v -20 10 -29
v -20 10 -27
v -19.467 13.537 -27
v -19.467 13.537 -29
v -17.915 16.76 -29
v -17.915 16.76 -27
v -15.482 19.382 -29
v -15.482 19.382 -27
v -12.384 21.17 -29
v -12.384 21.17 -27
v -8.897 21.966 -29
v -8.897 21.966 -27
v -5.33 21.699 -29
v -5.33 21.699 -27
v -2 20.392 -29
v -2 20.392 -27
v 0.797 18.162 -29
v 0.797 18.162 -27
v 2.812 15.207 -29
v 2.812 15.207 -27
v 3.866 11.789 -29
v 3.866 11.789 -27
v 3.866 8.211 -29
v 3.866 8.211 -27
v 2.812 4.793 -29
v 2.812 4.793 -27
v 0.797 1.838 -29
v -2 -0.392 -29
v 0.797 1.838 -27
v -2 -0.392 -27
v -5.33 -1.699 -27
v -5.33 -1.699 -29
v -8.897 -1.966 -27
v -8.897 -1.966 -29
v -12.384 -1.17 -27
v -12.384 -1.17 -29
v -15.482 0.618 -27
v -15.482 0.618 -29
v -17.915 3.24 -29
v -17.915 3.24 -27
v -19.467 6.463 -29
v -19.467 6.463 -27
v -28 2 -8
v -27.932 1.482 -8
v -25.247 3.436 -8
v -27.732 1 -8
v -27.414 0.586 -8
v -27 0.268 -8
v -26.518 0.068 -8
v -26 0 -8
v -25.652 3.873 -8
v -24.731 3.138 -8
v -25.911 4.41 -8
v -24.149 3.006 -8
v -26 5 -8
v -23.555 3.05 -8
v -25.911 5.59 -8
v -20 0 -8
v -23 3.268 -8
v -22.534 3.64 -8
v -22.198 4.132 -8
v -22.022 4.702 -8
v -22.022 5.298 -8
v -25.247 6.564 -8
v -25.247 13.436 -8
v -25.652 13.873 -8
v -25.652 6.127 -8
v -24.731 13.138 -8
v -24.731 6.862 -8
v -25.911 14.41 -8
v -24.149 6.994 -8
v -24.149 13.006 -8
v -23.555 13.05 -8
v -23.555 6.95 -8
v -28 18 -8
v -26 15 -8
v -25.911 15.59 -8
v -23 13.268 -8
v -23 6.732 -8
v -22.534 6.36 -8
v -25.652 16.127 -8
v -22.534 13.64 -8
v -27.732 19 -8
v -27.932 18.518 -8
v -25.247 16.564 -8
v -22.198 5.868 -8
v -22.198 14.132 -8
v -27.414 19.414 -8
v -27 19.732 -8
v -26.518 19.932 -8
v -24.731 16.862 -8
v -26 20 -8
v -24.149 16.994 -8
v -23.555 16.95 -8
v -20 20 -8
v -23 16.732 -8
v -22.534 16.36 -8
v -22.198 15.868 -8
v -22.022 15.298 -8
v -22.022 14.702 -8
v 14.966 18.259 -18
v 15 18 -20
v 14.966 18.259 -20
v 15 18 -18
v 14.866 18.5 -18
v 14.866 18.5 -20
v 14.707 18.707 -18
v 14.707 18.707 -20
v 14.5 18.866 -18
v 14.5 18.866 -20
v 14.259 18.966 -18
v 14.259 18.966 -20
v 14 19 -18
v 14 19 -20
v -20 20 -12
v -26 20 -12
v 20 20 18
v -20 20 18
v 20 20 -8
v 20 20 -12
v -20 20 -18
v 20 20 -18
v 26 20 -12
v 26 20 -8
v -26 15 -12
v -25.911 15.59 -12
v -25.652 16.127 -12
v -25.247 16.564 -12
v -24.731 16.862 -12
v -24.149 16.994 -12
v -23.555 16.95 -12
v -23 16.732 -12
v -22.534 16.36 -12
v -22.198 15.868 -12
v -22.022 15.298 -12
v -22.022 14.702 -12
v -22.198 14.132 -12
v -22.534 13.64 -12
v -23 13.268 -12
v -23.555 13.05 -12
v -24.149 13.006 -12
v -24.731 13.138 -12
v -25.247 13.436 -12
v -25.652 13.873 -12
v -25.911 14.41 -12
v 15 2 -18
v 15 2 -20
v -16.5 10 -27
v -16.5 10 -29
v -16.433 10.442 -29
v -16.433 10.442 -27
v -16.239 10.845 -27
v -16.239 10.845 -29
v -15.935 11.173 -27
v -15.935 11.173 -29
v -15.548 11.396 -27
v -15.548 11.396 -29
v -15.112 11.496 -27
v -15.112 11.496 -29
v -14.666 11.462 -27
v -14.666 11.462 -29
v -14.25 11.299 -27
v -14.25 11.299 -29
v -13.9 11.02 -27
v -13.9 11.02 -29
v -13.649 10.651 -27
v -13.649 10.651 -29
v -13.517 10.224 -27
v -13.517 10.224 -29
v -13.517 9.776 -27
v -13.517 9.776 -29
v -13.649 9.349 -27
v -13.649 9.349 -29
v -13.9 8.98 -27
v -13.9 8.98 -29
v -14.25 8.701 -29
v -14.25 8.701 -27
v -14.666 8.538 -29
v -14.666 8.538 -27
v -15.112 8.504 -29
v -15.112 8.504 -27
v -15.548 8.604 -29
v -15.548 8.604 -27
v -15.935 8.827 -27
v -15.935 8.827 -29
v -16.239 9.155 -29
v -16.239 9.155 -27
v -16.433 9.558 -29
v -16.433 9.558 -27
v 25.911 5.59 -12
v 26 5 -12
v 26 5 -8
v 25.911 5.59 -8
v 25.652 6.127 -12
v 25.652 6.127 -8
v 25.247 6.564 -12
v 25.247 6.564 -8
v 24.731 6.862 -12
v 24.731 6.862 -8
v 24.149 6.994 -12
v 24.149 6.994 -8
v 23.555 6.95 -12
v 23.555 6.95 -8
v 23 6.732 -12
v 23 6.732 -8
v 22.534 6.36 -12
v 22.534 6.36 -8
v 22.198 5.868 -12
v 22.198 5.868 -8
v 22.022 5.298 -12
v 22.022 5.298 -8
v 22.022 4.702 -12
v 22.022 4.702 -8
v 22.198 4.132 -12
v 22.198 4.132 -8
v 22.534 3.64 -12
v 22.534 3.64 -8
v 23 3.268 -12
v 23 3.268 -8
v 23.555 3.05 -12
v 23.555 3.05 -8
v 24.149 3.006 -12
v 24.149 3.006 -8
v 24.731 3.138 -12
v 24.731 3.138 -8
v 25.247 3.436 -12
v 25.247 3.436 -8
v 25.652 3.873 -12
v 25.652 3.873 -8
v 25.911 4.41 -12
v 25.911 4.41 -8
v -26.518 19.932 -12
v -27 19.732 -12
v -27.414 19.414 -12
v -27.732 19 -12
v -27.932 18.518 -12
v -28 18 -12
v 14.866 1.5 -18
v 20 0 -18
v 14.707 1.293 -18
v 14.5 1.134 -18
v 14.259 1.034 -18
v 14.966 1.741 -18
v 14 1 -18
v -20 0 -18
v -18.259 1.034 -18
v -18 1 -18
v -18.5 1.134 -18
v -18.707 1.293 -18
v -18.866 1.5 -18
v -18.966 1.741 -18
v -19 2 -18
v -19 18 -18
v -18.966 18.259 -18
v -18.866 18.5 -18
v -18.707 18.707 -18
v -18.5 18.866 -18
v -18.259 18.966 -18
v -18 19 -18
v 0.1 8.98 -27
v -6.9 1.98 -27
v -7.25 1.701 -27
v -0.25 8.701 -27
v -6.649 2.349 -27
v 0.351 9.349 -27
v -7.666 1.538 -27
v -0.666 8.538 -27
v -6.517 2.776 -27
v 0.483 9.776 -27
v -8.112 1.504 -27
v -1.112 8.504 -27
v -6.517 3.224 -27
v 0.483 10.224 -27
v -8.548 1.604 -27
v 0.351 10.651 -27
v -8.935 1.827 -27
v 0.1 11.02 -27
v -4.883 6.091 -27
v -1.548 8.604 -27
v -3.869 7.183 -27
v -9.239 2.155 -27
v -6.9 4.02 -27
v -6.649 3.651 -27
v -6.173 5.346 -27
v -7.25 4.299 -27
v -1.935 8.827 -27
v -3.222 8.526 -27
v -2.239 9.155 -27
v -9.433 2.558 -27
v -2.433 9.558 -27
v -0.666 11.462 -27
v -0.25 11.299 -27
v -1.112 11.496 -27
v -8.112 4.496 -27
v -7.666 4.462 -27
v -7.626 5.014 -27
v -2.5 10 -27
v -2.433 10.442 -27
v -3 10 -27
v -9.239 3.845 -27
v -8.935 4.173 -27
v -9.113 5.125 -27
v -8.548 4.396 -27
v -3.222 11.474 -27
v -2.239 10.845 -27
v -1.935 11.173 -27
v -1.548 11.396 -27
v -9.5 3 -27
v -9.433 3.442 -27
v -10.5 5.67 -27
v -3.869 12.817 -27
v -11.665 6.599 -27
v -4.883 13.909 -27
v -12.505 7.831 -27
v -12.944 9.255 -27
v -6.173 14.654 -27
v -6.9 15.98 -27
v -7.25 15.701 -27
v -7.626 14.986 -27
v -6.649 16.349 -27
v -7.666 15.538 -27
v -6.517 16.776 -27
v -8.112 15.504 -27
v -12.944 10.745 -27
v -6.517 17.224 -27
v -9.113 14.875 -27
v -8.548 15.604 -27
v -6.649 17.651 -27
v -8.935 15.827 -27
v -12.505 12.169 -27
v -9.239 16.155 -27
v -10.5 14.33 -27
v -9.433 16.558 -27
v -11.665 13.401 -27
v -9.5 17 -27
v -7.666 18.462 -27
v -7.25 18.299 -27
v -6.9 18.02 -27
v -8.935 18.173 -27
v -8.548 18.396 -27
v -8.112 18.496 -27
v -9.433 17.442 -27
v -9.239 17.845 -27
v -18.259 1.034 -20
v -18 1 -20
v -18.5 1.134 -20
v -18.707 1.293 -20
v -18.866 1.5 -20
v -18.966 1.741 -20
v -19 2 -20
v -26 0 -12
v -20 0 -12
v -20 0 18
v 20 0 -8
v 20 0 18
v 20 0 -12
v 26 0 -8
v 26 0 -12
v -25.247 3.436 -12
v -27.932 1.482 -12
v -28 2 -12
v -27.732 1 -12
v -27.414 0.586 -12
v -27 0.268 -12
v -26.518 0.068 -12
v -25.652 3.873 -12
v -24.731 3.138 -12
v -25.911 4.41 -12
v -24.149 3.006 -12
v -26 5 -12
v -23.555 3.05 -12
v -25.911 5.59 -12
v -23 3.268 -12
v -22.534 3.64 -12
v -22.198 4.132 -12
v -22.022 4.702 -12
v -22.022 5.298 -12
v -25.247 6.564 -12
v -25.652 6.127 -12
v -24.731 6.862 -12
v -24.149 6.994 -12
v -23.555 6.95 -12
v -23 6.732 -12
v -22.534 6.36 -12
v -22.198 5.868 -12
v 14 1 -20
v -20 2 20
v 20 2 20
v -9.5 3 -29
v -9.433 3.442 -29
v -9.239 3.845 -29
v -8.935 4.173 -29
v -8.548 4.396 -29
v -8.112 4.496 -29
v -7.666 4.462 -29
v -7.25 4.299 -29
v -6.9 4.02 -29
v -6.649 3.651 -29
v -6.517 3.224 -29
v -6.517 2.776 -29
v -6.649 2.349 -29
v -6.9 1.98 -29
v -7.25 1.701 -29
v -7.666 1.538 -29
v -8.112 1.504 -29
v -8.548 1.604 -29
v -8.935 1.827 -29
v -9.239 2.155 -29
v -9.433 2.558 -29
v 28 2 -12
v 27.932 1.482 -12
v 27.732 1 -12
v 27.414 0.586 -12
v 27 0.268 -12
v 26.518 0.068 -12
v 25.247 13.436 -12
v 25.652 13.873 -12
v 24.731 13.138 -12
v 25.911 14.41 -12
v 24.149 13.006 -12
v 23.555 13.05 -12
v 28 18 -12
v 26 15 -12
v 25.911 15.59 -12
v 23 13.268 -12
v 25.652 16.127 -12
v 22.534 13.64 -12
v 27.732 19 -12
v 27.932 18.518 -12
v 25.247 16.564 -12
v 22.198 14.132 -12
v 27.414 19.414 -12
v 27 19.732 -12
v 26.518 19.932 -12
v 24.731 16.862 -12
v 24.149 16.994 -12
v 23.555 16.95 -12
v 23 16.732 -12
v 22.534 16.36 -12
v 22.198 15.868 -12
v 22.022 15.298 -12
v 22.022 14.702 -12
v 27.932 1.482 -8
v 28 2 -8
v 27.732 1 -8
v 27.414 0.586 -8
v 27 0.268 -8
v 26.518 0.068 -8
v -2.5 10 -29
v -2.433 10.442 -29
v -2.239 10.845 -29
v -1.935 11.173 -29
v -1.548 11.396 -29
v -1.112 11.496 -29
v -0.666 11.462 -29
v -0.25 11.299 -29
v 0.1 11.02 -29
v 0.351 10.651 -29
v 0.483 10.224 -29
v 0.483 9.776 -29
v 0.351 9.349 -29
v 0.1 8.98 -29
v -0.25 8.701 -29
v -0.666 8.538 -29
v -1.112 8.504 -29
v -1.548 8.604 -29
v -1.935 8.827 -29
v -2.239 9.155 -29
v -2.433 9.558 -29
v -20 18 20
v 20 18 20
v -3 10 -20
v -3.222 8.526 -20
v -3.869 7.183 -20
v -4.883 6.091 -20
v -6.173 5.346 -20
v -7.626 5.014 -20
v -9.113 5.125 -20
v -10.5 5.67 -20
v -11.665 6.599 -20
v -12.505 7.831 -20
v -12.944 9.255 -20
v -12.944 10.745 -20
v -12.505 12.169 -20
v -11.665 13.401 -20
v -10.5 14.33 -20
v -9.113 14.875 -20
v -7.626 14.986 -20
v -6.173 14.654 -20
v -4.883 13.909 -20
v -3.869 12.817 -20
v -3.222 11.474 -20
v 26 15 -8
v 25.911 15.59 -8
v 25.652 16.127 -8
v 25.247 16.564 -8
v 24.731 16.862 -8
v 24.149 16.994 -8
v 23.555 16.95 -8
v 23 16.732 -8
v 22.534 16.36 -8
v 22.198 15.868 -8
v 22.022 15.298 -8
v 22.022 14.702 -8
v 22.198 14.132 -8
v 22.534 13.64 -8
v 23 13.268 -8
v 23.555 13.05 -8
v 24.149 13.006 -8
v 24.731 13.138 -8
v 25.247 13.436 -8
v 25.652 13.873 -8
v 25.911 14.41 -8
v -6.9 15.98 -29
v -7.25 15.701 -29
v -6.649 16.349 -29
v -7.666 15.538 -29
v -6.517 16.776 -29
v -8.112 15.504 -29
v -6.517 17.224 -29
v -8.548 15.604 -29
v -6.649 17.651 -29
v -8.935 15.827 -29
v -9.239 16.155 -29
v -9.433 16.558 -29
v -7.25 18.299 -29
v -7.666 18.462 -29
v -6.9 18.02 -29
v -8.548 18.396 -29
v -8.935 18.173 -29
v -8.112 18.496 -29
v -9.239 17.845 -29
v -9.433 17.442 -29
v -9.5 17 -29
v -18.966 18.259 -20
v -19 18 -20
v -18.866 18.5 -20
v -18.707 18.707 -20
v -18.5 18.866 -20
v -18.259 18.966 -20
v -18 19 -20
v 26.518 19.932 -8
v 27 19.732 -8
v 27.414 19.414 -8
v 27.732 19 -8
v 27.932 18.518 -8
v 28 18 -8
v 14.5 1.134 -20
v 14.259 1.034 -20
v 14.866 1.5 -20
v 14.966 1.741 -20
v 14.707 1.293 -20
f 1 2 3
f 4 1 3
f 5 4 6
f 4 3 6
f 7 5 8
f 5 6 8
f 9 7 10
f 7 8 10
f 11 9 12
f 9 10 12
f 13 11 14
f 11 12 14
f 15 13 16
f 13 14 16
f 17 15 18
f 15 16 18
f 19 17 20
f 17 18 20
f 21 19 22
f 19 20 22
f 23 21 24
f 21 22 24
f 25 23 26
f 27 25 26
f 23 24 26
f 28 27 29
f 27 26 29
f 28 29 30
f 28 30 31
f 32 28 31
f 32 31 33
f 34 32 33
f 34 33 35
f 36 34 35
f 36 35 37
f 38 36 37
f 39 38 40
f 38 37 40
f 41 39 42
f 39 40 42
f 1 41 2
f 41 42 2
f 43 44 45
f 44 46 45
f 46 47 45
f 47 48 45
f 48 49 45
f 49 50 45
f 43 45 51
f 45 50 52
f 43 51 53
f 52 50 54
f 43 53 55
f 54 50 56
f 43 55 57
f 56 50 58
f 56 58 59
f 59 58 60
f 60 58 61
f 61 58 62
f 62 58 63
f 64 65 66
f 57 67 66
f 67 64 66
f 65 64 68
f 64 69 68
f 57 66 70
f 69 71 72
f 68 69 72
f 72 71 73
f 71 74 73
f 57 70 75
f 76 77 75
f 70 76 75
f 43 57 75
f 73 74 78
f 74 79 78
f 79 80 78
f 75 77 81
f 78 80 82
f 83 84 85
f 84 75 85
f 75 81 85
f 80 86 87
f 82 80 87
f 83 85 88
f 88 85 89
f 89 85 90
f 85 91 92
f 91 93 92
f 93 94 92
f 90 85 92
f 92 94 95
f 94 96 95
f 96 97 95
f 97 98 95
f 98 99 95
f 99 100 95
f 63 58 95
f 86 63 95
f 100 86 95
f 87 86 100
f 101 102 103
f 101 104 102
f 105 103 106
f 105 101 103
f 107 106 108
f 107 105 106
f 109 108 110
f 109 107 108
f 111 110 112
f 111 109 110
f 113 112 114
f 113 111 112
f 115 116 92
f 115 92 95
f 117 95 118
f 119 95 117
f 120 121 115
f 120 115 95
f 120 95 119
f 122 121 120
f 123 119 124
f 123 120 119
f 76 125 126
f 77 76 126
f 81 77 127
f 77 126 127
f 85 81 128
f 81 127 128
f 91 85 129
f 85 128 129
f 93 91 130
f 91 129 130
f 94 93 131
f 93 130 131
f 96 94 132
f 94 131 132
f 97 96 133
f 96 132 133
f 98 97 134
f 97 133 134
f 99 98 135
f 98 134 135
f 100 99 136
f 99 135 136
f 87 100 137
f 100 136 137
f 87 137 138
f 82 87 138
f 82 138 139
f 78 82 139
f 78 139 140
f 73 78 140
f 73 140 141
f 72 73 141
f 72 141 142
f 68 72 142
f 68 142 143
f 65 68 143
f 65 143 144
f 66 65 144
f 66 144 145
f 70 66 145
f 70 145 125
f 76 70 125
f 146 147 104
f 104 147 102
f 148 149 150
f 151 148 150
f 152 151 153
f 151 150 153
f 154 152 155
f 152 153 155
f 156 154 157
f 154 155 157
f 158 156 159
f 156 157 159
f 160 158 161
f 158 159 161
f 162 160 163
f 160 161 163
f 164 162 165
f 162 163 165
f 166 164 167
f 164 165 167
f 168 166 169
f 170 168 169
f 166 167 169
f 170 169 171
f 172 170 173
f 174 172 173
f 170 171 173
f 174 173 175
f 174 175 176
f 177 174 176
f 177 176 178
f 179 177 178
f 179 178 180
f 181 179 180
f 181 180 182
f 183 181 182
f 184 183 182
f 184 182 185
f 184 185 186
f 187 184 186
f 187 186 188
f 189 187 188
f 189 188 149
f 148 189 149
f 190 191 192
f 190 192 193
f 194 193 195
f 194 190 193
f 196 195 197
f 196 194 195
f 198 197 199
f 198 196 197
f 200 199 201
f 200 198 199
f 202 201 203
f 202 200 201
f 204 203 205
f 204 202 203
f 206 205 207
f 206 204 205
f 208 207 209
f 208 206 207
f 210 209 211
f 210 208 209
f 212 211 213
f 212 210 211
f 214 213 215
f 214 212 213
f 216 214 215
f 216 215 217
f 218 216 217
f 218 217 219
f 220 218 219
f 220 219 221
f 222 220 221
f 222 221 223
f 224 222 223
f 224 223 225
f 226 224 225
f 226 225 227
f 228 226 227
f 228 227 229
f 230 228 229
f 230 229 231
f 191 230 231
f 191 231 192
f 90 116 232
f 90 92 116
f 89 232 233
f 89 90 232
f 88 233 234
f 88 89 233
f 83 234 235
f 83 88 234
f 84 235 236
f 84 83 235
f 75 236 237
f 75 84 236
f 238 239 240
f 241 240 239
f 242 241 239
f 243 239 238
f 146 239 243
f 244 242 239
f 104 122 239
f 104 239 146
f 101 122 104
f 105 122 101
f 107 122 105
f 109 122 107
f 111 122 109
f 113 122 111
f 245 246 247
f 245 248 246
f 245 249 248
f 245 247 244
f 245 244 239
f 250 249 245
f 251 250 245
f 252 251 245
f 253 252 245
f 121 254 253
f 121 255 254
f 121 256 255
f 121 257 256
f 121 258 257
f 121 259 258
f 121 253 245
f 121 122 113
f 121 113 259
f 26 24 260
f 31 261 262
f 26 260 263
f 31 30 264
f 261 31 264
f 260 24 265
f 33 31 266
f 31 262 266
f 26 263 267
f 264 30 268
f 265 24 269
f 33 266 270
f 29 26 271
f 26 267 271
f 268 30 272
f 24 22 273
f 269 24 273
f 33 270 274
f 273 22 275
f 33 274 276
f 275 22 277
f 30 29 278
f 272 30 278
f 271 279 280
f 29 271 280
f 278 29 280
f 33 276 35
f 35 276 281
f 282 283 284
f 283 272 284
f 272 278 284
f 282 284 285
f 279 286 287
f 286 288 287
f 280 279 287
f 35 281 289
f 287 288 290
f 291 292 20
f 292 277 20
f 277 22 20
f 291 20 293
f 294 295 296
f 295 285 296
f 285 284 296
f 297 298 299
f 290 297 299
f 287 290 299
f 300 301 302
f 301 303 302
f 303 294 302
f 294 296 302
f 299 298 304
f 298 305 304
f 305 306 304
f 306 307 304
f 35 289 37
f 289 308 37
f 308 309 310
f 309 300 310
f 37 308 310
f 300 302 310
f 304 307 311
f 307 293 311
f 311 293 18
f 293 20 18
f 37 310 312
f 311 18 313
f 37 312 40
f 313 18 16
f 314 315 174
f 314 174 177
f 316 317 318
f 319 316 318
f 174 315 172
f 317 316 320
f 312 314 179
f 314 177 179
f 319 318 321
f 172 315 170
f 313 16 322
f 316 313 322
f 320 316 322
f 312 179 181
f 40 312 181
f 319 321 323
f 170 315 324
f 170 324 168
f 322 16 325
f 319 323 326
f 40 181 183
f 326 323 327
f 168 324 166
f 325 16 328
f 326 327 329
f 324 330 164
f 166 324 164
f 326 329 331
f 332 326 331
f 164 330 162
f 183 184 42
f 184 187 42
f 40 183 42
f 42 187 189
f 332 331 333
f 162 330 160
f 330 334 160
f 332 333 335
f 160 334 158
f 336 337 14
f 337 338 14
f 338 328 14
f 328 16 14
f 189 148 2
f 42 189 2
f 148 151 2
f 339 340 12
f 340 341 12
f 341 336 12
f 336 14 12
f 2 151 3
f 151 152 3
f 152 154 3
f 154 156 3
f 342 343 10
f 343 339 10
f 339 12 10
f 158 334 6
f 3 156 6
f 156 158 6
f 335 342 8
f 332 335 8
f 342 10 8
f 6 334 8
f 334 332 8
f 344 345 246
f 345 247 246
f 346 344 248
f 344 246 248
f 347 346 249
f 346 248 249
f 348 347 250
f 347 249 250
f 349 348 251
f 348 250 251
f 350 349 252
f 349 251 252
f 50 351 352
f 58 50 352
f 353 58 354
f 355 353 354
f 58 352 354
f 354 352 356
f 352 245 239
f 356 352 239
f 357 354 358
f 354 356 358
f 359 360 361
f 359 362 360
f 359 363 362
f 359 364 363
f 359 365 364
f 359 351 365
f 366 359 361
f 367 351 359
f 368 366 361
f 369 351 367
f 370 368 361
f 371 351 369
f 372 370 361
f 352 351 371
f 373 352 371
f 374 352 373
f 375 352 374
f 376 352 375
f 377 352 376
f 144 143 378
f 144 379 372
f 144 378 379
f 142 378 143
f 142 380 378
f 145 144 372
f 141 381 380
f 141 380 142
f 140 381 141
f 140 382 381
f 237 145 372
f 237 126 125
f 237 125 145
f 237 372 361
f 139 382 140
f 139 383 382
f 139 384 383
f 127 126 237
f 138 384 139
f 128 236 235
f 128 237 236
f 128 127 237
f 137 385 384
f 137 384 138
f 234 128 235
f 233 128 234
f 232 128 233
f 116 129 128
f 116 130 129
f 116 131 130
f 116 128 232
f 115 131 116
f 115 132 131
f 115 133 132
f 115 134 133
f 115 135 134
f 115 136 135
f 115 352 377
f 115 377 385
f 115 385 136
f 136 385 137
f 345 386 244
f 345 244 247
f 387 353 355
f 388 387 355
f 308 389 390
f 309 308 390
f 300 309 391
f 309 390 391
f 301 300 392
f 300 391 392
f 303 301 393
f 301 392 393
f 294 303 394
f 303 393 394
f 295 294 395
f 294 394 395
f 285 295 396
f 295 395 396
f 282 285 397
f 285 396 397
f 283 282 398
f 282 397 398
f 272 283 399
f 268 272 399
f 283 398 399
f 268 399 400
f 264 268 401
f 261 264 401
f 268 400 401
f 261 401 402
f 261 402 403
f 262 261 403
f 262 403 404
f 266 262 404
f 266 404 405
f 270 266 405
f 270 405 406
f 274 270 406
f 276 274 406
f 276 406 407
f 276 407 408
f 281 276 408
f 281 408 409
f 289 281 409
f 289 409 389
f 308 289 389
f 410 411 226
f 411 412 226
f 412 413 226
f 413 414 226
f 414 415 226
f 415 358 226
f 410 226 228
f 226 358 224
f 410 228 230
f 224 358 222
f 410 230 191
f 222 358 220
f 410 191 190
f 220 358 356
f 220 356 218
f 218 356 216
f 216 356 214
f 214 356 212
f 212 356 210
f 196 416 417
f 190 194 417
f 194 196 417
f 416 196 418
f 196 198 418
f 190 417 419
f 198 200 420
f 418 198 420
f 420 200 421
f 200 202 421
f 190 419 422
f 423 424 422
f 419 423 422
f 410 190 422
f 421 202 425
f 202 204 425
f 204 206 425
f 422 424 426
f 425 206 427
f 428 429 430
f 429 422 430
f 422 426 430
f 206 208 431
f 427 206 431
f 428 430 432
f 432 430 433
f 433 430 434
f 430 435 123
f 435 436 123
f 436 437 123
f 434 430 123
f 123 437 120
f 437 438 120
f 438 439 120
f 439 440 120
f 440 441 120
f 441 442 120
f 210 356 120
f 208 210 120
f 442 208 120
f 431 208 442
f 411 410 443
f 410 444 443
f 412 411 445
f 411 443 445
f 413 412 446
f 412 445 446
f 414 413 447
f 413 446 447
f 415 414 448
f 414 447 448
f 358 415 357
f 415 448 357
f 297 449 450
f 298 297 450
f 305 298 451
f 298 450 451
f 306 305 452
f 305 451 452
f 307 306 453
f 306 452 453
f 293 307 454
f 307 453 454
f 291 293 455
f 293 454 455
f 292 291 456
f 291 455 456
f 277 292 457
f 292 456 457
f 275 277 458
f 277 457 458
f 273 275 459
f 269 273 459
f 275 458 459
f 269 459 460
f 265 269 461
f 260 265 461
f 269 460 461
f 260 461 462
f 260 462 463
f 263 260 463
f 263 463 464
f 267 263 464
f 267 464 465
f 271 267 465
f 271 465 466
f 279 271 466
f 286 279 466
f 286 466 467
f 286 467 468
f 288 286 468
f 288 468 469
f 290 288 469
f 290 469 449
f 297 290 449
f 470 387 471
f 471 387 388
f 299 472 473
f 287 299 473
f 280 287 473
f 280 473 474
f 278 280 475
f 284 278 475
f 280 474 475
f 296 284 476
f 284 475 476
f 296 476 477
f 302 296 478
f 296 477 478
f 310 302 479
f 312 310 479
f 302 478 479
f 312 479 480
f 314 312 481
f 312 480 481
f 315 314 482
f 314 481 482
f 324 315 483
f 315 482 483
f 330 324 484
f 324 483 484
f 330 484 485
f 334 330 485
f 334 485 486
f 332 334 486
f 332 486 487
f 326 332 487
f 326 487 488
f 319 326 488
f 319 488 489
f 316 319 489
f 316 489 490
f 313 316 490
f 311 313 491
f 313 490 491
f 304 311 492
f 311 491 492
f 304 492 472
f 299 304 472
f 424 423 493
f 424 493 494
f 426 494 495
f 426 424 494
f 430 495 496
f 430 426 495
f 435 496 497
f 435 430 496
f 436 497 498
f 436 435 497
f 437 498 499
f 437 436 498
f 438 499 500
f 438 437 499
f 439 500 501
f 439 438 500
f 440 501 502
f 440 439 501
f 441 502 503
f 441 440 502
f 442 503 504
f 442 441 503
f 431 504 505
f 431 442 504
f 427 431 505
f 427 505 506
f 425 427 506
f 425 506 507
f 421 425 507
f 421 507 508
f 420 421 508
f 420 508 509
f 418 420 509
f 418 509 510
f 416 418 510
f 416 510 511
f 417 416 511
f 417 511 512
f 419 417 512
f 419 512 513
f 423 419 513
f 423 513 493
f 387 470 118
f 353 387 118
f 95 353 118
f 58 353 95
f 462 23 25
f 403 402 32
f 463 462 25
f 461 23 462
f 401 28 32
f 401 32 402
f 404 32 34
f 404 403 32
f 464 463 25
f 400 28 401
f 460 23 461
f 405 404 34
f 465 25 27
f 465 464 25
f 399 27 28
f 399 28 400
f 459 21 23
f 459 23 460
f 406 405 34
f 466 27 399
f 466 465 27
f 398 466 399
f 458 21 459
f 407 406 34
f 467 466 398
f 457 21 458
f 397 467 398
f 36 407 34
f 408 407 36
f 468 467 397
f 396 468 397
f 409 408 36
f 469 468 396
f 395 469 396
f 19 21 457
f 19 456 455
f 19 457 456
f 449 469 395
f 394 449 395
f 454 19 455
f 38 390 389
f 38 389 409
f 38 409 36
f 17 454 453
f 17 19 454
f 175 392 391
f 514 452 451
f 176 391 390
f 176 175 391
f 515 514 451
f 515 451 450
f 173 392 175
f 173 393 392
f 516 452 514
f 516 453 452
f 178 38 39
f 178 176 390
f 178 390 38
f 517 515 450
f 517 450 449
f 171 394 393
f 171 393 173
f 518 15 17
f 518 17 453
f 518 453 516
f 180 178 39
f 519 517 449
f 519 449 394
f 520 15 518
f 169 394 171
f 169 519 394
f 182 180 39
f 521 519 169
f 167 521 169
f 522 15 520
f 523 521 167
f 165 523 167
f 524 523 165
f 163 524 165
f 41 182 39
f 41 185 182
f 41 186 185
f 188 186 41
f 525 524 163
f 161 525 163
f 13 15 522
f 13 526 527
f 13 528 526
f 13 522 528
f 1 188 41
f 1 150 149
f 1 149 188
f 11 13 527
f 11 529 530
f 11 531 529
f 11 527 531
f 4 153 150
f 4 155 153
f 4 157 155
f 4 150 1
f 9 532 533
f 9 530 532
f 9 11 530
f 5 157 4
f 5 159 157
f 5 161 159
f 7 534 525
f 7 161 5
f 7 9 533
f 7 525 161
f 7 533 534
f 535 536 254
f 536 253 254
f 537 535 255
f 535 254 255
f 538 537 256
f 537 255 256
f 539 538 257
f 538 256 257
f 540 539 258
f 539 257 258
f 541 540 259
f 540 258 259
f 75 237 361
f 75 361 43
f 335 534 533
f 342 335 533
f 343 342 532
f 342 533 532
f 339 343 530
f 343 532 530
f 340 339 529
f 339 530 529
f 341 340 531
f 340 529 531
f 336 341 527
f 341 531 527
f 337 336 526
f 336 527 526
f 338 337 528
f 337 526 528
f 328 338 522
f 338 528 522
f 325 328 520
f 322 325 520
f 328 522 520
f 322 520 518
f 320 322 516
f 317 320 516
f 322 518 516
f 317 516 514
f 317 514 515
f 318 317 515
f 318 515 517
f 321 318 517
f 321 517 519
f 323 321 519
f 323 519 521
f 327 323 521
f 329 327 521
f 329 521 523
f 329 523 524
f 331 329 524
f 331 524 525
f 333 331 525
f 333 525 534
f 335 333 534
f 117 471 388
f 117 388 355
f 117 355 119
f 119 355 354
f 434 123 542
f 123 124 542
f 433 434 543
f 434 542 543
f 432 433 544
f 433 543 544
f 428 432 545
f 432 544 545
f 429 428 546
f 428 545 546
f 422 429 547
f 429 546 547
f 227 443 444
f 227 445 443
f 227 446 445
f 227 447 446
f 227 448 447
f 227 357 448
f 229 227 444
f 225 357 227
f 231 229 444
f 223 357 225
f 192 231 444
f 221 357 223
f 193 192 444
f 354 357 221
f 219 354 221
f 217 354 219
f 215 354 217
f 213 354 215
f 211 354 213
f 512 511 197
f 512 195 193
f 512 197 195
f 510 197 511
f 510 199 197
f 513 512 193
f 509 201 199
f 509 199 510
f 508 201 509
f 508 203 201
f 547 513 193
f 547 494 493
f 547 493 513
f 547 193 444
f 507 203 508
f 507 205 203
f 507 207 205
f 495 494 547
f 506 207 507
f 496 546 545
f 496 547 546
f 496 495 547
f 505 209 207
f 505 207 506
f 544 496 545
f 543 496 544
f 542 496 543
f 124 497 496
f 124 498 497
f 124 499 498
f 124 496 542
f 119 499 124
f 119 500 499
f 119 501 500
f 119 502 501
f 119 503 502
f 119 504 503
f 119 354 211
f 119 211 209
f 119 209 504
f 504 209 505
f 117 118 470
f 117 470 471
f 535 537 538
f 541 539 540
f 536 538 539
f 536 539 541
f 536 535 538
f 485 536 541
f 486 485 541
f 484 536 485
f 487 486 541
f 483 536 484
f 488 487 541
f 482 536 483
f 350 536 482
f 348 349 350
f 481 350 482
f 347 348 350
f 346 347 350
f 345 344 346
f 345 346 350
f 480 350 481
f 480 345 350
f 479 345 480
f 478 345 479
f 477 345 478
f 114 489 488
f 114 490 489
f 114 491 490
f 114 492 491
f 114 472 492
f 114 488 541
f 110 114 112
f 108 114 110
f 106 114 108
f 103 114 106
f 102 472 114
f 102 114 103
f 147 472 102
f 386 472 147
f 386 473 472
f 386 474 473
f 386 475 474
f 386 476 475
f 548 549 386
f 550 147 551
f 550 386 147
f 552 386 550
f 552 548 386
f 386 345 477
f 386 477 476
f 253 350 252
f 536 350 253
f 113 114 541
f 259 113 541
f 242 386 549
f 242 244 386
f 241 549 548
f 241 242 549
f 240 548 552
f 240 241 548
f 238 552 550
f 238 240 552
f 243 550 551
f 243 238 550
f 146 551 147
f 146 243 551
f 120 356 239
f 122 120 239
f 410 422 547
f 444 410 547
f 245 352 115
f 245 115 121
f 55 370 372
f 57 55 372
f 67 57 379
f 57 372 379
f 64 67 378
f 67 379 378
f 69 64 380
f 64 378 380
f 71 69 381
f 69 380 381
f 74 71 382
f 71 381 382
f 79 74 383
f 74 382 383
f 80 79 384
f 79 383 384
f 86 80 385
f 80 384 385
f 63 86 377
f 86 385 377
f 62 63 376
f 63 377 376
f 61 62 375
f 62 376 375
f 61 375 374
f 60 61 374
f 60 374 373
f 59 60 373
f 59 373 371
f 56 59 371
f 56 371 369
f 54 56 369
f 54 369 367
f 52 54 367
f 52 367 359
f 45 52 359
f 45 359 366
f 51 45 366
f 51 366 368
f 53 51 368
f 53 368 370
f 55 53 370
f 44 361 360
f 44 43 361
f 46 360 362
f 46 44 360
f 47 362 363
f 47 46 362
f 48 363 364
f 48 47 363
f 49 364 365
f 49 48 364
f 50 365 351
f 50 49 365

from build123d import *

# Parameters (mm, degrees)
SKETCH_1_W             = 40
SKETCH_1_H             = 40
EXTRUDE_1_DEPTH        = 20
CHAMFER_1_SIZE         = 2
CHAMFER_2_SIZE         = 2
SKETCH_2_W             = 40
SKETCH_2_H             = 20
SKETCH_2_W_2           = 34
SKETCH_2_H_2           = 18
CUT_EXTRUDE_1_DEPTH    = 2
FILLET_1_R             = 1
FILLET_2_R             = 1
FILLET_3_R             = 1
FILLET_4_R             = 1
SKETCH_3_R             = 5
EXTRUDE_2_DEPTH        = 7
SKETCH_4_R             = 12
EXTRUDE_3_DEPTH        = 2
CUT_EXTRUDE_2_REACH    = 59.315
SKETCH_5_R             = 1.5
SKETCH_6_W             = 4
SKETCH_6_H             = 20
EXTRUDE_4_DEPTH        = 8
CUT_EXTRUDE_3_REACH    = 49.875
SKETCH_7_R             = 2
FILLET_5_R             = 2
FILLET_6_R             = 2
FILLET_5_OF_MIRROR_1_R = 2
FILLET_6_OF_MIRROR_1_R = 2


with BuildPart() as part:
    # 草图1 → 凸台-拉伸1 (new body)
    with BuildSketch(Plane(origin=(0, 0, 0), x_dir=(1, 0, 0), z_dir=(0, 1, 0))):
        Rectangle(SKETCH_1_W, SKETCH_1_H)
    extrude(amount=EXTRUDE_1_DEPTH)

    # Chamfer 1
    chamfer_1_edges = [part.edges().sort_by_distance(p)[0] for p in [
        (0, 0, 20),
    ]]
    chamfer(chamfer_1_edges, length=CHAMFER_1_SIZE)

    # Chamfer 2
    chamfer_2_edges = [part.edges().sort_by_distance(p)[0] for p in [
        (0, 20, 20),
    ]]
    chamfer(chamfer_2_edges, length=CHAMFER_2_SIZE)

    # 草图2 → 切除-拉伸1 (cut)
    with BuildSketch(Plane(origin=(0, 0, -20), x_dir=(-1, 0, 0), z_dir=(0, 0, -1))):
        with Locations((0, 10)):
            Rectangle(SKETCH_2_W, SKETCH_2_H)
        with Locations((2, 10)):
            Rectangle(SKETCH_2_W_2, SKETCH_2_H_2, mode=Mode.SUBTRACT)
    extrude(amount=-CUT_EXTRUDE_1_DEPTH, mode=Mode.SUBTRACT)

    # Fillet 1
    fillet_1_edges = [part.edges().sort_by_distance(p)[0] for p in [
        (15, 1, -19),
    ]]
    fillet(fillet_1_edges, radius=FILLET_1_R)

    # Fillet 2
    fillet_2_edges = [part.edges().sort_by_distance(p)[0] for p in [
        (15, 19, -19),
    ]]
    fillet(fillet_2_edges, radius=FILLET_2_R)

    # 圆角3
    fillet_3_edges = [part.edges().sort_by_distance(p)[0] for p in [
        (-19, 1, -19),
    ]]
    fillet(fillet_3_edges, radius=FILLET_3_R)

    # 圆角4
    fillet_4_edges = [part.edges().sort_by_distance(p)[0] for p in [
        (-19, 19, -19),
    ]]
    fillet(fillet_4_edges, radius=FILLET_4_R)

    # 草图3 → 凸台-拉伸2 (add)
    with BuildSketch(Plane(origin=(0, 0, -20), x_dir=(-1, 0, 0), z_dir=(0, 0, -1))):
        with Locations((8, 10)):
            Circle(SKETCH_3_R)
    extrude(amount=EXTRUDE_2_DEPTH)

    # 草图4 → 凸台-拉伸3 (add)
    with BuildSketch(Plane(origin=(0, 0, -27), x_dir=(-1, 0, 0), z_dir=(0, 0, -1))):
        with Locations((8, 10)):
            Circle(SKETCH_4_R)
    extrude(amount=EXTRUDE_3_DEPTH)

    # 草图5 → 切除-拉伸2 (cut, up to next)
    with BuildSketch(Plane(origin=(0, 0, -29), x_dir=(-1, 0, 0), z_dir=(0, 0, -1)), mode=Mode.PRIVATE) as cut_extrude_2_sk1:
        with Locations((8, 17)):
            Circle(SKETCH_5_R)
    cut_extrude_2_tool1 = extrude(cut_extrude_2_sk1.sketch, amount=-CUT_EXTRUDE_2_REACH, mode=Mode.PRIVATE) & part.part
    # 草图5 → 切除-拉伸2 (cut, up to next)
    with BuildSketch(Plane(origin=(0, 0, -29), x_dir=(-1, 0, 0), z_dir=(0, 0, -1)), mode=Mode.PRIVATE) as cut_extrude_2_sk2:
        with Locations((15, 10)):
            Circle(SKETCH_5_R)
    cut_extrude_2_tool2 = extrude(cut_extrude_2_sk2.sketch, amount=-CUT_EXTRUDE_2_REACH, mode=Mode.PRIVATE) & part.part
    # 草图5 → 切除-拉伸2 (cut, up to next)
    with BuildSketch(Plane(origin=(0, 0, -29), x_dir=(-1, 0, 0), z_dir=(0, 0, -1)), mode=Mode.PRIVATE) as cut_extrude_2_sk3:
        with Locations((8, 3)):
            Circle(SKETCH_5_R)
    cut_extrude_2_tool3 = extrude(cut_extrude_2_sk3.sketch, amount=-CUT_EXTRUDE_2_REACH, mode=Mode.PRIVATE) & part.part
    # 草图5 → 切除-拉伸2 (cut, up to next)
    with BuildSketch(Plane(origin=(0, 0, -29), x_dir=(-1, 0, 0), z_dir=(0, 0, -1)), mode=Mode.PRIVATE) as cut_extrude_2_sk4:
        with Locations((1, 10)):
            Circle(SKETCH_5_R)
    cut_extrude_2_tool4 = extrude(cut_extrude_2_sk4.sketch, amount=-CUT_EXTRUDE_2_REACH, mode=Mode.PRIVATE) & part.part
    add(cut_extrude_2_tool1.solids().sort_by_distance((-8, 17, -29))[0], mode=Mode.SUBTRACT)
    add(cut_extrude_2_tool2.solids().sort_by_distance((-15, 10, -29))[0], mode=Mode.SUBTRACT)
    add(cut_extrude_2_tool3.solids().sort_by_distance((-8, 3, -29))[0], mode=Mode.SUBTRACT)
    add(cut_extrude_2_tool4.solids().sort_by_distance((-1, 10, -29))[0], mode=Mode.SUBTRACT)

    # 草图6 → 凸台-拉伸4 (add)
    with BuildSketch(Plane.ZY.offset(20)):
        with Locations((-10, 10)):
            Rectangle(SKETCH_6_W, SKETCH_6_H)
    extrude_4 = extrude(amount=EXTRUDE_4_DEPTH)

    # 草图7 → 切除-拉伸3 (cut, up to next)
    with BuildSketch(Plane(origin=(0, 0, -12), x_dir=(-1, 0, 0), z_dir=(0, 0, -1)), mode=Mode.PRIVATE) as cut_extrude_3_sk1:
        with Locations((24, 15)):
            Circle(SKETCH_7_R)
    cut_extrude_3_tool1 = extrude(cut_extrude_3_sk1.sketch, amount=-CUT_EXTRUDE_3_REACH, mode=Mode.PRIVATE) & part.part
    # 草图7 → 切除-拉伸3 (cut, up to next)
    with BuildSketch(Plane(origin=(0, 0, -12), x_dir=(-1, 0, 0), z_dir=(0, 0, -1)), mode=Mode.PRIVATE) as cut_extrude_3_sk2:
        with Locations((24, 5)):
            Circle(SKETCH_7_R)
    cut_extrude_3_tool2 = extrude(cut_extrude_3_sk2.sketch, amount=-CUT_EXTRUDE_3_REACH, mode=Mode.PRIVATE) & part.part
    cut_extrude_3_1 = cut_extrude_3_tool1.solids().sort_by_distance((-24, 15, -12))[0]
    add(cut_extrude_3_1, mode=Mode.SUBTRACT)
    cut_extrude_3_2 = cut_extrude_3_tool2.solids().sort_by_distance((-24, 5, -12))[0]
    add(cut_extrude_3_2, mode=Mode.SUBTRACT)
    cut_extrude_3 = cut_extrude_3_1 + cut_extrude_3_2  # 切除-拉伸3 as one shape, for the pattern or mirror that repeats it

    # 圆角5
    fillet_5_edges = [part.edges().sort_by_distance(p)[0] for p in [
        (-28, 20, -10),
    ]]
    fillet(fillet_5_edges, radius=FILLET_5_R)

    # 圆角6
    fillet_6_edges = [part.edges().sort_by_distance(p)[0] for p in [
        (-28, 0, -10),
    ]]
    fillet(fillet_6_edges, radius=FILLET_6_R)

    # 镜向1: 凸台-拉伸4, 切除-拉伸3 across plane
    add(extrude_4.mirror(Plane(origin=(0, 0, 0), x_dir=(0, 0, 1), z_dir=(1, 0, 0))))
    add(cut_extrude_3.mirror(Plane(origin=(0, 0, 0), x_dir=(0, 0, 1), z_dir=(1, 0, 0))), mode=Mode.SUBTRACT)

    # 圆角5 of 镜向1
    fillet_5_of_mirror_1_edges = [part.edges().sort_by_distance(p)[0] for p in [
        (28, 20, -10),
    ]]
    fillet(fillet_5_of_mirror_1_edges, radius=FILLET_5_OF_MIRROR_1_R)

    # 圆角6 of 镜向1
    fillet_6_of_mirror_1_edges = [part.edges().sort_by_distance(p)[0] for p in [
        (28, 0, -10),
    ]]
    fillet(fillet_6_of_mirror_1_edges, radius=FILLET_6_OF_MIRROR_1_R)


solid = part.part
